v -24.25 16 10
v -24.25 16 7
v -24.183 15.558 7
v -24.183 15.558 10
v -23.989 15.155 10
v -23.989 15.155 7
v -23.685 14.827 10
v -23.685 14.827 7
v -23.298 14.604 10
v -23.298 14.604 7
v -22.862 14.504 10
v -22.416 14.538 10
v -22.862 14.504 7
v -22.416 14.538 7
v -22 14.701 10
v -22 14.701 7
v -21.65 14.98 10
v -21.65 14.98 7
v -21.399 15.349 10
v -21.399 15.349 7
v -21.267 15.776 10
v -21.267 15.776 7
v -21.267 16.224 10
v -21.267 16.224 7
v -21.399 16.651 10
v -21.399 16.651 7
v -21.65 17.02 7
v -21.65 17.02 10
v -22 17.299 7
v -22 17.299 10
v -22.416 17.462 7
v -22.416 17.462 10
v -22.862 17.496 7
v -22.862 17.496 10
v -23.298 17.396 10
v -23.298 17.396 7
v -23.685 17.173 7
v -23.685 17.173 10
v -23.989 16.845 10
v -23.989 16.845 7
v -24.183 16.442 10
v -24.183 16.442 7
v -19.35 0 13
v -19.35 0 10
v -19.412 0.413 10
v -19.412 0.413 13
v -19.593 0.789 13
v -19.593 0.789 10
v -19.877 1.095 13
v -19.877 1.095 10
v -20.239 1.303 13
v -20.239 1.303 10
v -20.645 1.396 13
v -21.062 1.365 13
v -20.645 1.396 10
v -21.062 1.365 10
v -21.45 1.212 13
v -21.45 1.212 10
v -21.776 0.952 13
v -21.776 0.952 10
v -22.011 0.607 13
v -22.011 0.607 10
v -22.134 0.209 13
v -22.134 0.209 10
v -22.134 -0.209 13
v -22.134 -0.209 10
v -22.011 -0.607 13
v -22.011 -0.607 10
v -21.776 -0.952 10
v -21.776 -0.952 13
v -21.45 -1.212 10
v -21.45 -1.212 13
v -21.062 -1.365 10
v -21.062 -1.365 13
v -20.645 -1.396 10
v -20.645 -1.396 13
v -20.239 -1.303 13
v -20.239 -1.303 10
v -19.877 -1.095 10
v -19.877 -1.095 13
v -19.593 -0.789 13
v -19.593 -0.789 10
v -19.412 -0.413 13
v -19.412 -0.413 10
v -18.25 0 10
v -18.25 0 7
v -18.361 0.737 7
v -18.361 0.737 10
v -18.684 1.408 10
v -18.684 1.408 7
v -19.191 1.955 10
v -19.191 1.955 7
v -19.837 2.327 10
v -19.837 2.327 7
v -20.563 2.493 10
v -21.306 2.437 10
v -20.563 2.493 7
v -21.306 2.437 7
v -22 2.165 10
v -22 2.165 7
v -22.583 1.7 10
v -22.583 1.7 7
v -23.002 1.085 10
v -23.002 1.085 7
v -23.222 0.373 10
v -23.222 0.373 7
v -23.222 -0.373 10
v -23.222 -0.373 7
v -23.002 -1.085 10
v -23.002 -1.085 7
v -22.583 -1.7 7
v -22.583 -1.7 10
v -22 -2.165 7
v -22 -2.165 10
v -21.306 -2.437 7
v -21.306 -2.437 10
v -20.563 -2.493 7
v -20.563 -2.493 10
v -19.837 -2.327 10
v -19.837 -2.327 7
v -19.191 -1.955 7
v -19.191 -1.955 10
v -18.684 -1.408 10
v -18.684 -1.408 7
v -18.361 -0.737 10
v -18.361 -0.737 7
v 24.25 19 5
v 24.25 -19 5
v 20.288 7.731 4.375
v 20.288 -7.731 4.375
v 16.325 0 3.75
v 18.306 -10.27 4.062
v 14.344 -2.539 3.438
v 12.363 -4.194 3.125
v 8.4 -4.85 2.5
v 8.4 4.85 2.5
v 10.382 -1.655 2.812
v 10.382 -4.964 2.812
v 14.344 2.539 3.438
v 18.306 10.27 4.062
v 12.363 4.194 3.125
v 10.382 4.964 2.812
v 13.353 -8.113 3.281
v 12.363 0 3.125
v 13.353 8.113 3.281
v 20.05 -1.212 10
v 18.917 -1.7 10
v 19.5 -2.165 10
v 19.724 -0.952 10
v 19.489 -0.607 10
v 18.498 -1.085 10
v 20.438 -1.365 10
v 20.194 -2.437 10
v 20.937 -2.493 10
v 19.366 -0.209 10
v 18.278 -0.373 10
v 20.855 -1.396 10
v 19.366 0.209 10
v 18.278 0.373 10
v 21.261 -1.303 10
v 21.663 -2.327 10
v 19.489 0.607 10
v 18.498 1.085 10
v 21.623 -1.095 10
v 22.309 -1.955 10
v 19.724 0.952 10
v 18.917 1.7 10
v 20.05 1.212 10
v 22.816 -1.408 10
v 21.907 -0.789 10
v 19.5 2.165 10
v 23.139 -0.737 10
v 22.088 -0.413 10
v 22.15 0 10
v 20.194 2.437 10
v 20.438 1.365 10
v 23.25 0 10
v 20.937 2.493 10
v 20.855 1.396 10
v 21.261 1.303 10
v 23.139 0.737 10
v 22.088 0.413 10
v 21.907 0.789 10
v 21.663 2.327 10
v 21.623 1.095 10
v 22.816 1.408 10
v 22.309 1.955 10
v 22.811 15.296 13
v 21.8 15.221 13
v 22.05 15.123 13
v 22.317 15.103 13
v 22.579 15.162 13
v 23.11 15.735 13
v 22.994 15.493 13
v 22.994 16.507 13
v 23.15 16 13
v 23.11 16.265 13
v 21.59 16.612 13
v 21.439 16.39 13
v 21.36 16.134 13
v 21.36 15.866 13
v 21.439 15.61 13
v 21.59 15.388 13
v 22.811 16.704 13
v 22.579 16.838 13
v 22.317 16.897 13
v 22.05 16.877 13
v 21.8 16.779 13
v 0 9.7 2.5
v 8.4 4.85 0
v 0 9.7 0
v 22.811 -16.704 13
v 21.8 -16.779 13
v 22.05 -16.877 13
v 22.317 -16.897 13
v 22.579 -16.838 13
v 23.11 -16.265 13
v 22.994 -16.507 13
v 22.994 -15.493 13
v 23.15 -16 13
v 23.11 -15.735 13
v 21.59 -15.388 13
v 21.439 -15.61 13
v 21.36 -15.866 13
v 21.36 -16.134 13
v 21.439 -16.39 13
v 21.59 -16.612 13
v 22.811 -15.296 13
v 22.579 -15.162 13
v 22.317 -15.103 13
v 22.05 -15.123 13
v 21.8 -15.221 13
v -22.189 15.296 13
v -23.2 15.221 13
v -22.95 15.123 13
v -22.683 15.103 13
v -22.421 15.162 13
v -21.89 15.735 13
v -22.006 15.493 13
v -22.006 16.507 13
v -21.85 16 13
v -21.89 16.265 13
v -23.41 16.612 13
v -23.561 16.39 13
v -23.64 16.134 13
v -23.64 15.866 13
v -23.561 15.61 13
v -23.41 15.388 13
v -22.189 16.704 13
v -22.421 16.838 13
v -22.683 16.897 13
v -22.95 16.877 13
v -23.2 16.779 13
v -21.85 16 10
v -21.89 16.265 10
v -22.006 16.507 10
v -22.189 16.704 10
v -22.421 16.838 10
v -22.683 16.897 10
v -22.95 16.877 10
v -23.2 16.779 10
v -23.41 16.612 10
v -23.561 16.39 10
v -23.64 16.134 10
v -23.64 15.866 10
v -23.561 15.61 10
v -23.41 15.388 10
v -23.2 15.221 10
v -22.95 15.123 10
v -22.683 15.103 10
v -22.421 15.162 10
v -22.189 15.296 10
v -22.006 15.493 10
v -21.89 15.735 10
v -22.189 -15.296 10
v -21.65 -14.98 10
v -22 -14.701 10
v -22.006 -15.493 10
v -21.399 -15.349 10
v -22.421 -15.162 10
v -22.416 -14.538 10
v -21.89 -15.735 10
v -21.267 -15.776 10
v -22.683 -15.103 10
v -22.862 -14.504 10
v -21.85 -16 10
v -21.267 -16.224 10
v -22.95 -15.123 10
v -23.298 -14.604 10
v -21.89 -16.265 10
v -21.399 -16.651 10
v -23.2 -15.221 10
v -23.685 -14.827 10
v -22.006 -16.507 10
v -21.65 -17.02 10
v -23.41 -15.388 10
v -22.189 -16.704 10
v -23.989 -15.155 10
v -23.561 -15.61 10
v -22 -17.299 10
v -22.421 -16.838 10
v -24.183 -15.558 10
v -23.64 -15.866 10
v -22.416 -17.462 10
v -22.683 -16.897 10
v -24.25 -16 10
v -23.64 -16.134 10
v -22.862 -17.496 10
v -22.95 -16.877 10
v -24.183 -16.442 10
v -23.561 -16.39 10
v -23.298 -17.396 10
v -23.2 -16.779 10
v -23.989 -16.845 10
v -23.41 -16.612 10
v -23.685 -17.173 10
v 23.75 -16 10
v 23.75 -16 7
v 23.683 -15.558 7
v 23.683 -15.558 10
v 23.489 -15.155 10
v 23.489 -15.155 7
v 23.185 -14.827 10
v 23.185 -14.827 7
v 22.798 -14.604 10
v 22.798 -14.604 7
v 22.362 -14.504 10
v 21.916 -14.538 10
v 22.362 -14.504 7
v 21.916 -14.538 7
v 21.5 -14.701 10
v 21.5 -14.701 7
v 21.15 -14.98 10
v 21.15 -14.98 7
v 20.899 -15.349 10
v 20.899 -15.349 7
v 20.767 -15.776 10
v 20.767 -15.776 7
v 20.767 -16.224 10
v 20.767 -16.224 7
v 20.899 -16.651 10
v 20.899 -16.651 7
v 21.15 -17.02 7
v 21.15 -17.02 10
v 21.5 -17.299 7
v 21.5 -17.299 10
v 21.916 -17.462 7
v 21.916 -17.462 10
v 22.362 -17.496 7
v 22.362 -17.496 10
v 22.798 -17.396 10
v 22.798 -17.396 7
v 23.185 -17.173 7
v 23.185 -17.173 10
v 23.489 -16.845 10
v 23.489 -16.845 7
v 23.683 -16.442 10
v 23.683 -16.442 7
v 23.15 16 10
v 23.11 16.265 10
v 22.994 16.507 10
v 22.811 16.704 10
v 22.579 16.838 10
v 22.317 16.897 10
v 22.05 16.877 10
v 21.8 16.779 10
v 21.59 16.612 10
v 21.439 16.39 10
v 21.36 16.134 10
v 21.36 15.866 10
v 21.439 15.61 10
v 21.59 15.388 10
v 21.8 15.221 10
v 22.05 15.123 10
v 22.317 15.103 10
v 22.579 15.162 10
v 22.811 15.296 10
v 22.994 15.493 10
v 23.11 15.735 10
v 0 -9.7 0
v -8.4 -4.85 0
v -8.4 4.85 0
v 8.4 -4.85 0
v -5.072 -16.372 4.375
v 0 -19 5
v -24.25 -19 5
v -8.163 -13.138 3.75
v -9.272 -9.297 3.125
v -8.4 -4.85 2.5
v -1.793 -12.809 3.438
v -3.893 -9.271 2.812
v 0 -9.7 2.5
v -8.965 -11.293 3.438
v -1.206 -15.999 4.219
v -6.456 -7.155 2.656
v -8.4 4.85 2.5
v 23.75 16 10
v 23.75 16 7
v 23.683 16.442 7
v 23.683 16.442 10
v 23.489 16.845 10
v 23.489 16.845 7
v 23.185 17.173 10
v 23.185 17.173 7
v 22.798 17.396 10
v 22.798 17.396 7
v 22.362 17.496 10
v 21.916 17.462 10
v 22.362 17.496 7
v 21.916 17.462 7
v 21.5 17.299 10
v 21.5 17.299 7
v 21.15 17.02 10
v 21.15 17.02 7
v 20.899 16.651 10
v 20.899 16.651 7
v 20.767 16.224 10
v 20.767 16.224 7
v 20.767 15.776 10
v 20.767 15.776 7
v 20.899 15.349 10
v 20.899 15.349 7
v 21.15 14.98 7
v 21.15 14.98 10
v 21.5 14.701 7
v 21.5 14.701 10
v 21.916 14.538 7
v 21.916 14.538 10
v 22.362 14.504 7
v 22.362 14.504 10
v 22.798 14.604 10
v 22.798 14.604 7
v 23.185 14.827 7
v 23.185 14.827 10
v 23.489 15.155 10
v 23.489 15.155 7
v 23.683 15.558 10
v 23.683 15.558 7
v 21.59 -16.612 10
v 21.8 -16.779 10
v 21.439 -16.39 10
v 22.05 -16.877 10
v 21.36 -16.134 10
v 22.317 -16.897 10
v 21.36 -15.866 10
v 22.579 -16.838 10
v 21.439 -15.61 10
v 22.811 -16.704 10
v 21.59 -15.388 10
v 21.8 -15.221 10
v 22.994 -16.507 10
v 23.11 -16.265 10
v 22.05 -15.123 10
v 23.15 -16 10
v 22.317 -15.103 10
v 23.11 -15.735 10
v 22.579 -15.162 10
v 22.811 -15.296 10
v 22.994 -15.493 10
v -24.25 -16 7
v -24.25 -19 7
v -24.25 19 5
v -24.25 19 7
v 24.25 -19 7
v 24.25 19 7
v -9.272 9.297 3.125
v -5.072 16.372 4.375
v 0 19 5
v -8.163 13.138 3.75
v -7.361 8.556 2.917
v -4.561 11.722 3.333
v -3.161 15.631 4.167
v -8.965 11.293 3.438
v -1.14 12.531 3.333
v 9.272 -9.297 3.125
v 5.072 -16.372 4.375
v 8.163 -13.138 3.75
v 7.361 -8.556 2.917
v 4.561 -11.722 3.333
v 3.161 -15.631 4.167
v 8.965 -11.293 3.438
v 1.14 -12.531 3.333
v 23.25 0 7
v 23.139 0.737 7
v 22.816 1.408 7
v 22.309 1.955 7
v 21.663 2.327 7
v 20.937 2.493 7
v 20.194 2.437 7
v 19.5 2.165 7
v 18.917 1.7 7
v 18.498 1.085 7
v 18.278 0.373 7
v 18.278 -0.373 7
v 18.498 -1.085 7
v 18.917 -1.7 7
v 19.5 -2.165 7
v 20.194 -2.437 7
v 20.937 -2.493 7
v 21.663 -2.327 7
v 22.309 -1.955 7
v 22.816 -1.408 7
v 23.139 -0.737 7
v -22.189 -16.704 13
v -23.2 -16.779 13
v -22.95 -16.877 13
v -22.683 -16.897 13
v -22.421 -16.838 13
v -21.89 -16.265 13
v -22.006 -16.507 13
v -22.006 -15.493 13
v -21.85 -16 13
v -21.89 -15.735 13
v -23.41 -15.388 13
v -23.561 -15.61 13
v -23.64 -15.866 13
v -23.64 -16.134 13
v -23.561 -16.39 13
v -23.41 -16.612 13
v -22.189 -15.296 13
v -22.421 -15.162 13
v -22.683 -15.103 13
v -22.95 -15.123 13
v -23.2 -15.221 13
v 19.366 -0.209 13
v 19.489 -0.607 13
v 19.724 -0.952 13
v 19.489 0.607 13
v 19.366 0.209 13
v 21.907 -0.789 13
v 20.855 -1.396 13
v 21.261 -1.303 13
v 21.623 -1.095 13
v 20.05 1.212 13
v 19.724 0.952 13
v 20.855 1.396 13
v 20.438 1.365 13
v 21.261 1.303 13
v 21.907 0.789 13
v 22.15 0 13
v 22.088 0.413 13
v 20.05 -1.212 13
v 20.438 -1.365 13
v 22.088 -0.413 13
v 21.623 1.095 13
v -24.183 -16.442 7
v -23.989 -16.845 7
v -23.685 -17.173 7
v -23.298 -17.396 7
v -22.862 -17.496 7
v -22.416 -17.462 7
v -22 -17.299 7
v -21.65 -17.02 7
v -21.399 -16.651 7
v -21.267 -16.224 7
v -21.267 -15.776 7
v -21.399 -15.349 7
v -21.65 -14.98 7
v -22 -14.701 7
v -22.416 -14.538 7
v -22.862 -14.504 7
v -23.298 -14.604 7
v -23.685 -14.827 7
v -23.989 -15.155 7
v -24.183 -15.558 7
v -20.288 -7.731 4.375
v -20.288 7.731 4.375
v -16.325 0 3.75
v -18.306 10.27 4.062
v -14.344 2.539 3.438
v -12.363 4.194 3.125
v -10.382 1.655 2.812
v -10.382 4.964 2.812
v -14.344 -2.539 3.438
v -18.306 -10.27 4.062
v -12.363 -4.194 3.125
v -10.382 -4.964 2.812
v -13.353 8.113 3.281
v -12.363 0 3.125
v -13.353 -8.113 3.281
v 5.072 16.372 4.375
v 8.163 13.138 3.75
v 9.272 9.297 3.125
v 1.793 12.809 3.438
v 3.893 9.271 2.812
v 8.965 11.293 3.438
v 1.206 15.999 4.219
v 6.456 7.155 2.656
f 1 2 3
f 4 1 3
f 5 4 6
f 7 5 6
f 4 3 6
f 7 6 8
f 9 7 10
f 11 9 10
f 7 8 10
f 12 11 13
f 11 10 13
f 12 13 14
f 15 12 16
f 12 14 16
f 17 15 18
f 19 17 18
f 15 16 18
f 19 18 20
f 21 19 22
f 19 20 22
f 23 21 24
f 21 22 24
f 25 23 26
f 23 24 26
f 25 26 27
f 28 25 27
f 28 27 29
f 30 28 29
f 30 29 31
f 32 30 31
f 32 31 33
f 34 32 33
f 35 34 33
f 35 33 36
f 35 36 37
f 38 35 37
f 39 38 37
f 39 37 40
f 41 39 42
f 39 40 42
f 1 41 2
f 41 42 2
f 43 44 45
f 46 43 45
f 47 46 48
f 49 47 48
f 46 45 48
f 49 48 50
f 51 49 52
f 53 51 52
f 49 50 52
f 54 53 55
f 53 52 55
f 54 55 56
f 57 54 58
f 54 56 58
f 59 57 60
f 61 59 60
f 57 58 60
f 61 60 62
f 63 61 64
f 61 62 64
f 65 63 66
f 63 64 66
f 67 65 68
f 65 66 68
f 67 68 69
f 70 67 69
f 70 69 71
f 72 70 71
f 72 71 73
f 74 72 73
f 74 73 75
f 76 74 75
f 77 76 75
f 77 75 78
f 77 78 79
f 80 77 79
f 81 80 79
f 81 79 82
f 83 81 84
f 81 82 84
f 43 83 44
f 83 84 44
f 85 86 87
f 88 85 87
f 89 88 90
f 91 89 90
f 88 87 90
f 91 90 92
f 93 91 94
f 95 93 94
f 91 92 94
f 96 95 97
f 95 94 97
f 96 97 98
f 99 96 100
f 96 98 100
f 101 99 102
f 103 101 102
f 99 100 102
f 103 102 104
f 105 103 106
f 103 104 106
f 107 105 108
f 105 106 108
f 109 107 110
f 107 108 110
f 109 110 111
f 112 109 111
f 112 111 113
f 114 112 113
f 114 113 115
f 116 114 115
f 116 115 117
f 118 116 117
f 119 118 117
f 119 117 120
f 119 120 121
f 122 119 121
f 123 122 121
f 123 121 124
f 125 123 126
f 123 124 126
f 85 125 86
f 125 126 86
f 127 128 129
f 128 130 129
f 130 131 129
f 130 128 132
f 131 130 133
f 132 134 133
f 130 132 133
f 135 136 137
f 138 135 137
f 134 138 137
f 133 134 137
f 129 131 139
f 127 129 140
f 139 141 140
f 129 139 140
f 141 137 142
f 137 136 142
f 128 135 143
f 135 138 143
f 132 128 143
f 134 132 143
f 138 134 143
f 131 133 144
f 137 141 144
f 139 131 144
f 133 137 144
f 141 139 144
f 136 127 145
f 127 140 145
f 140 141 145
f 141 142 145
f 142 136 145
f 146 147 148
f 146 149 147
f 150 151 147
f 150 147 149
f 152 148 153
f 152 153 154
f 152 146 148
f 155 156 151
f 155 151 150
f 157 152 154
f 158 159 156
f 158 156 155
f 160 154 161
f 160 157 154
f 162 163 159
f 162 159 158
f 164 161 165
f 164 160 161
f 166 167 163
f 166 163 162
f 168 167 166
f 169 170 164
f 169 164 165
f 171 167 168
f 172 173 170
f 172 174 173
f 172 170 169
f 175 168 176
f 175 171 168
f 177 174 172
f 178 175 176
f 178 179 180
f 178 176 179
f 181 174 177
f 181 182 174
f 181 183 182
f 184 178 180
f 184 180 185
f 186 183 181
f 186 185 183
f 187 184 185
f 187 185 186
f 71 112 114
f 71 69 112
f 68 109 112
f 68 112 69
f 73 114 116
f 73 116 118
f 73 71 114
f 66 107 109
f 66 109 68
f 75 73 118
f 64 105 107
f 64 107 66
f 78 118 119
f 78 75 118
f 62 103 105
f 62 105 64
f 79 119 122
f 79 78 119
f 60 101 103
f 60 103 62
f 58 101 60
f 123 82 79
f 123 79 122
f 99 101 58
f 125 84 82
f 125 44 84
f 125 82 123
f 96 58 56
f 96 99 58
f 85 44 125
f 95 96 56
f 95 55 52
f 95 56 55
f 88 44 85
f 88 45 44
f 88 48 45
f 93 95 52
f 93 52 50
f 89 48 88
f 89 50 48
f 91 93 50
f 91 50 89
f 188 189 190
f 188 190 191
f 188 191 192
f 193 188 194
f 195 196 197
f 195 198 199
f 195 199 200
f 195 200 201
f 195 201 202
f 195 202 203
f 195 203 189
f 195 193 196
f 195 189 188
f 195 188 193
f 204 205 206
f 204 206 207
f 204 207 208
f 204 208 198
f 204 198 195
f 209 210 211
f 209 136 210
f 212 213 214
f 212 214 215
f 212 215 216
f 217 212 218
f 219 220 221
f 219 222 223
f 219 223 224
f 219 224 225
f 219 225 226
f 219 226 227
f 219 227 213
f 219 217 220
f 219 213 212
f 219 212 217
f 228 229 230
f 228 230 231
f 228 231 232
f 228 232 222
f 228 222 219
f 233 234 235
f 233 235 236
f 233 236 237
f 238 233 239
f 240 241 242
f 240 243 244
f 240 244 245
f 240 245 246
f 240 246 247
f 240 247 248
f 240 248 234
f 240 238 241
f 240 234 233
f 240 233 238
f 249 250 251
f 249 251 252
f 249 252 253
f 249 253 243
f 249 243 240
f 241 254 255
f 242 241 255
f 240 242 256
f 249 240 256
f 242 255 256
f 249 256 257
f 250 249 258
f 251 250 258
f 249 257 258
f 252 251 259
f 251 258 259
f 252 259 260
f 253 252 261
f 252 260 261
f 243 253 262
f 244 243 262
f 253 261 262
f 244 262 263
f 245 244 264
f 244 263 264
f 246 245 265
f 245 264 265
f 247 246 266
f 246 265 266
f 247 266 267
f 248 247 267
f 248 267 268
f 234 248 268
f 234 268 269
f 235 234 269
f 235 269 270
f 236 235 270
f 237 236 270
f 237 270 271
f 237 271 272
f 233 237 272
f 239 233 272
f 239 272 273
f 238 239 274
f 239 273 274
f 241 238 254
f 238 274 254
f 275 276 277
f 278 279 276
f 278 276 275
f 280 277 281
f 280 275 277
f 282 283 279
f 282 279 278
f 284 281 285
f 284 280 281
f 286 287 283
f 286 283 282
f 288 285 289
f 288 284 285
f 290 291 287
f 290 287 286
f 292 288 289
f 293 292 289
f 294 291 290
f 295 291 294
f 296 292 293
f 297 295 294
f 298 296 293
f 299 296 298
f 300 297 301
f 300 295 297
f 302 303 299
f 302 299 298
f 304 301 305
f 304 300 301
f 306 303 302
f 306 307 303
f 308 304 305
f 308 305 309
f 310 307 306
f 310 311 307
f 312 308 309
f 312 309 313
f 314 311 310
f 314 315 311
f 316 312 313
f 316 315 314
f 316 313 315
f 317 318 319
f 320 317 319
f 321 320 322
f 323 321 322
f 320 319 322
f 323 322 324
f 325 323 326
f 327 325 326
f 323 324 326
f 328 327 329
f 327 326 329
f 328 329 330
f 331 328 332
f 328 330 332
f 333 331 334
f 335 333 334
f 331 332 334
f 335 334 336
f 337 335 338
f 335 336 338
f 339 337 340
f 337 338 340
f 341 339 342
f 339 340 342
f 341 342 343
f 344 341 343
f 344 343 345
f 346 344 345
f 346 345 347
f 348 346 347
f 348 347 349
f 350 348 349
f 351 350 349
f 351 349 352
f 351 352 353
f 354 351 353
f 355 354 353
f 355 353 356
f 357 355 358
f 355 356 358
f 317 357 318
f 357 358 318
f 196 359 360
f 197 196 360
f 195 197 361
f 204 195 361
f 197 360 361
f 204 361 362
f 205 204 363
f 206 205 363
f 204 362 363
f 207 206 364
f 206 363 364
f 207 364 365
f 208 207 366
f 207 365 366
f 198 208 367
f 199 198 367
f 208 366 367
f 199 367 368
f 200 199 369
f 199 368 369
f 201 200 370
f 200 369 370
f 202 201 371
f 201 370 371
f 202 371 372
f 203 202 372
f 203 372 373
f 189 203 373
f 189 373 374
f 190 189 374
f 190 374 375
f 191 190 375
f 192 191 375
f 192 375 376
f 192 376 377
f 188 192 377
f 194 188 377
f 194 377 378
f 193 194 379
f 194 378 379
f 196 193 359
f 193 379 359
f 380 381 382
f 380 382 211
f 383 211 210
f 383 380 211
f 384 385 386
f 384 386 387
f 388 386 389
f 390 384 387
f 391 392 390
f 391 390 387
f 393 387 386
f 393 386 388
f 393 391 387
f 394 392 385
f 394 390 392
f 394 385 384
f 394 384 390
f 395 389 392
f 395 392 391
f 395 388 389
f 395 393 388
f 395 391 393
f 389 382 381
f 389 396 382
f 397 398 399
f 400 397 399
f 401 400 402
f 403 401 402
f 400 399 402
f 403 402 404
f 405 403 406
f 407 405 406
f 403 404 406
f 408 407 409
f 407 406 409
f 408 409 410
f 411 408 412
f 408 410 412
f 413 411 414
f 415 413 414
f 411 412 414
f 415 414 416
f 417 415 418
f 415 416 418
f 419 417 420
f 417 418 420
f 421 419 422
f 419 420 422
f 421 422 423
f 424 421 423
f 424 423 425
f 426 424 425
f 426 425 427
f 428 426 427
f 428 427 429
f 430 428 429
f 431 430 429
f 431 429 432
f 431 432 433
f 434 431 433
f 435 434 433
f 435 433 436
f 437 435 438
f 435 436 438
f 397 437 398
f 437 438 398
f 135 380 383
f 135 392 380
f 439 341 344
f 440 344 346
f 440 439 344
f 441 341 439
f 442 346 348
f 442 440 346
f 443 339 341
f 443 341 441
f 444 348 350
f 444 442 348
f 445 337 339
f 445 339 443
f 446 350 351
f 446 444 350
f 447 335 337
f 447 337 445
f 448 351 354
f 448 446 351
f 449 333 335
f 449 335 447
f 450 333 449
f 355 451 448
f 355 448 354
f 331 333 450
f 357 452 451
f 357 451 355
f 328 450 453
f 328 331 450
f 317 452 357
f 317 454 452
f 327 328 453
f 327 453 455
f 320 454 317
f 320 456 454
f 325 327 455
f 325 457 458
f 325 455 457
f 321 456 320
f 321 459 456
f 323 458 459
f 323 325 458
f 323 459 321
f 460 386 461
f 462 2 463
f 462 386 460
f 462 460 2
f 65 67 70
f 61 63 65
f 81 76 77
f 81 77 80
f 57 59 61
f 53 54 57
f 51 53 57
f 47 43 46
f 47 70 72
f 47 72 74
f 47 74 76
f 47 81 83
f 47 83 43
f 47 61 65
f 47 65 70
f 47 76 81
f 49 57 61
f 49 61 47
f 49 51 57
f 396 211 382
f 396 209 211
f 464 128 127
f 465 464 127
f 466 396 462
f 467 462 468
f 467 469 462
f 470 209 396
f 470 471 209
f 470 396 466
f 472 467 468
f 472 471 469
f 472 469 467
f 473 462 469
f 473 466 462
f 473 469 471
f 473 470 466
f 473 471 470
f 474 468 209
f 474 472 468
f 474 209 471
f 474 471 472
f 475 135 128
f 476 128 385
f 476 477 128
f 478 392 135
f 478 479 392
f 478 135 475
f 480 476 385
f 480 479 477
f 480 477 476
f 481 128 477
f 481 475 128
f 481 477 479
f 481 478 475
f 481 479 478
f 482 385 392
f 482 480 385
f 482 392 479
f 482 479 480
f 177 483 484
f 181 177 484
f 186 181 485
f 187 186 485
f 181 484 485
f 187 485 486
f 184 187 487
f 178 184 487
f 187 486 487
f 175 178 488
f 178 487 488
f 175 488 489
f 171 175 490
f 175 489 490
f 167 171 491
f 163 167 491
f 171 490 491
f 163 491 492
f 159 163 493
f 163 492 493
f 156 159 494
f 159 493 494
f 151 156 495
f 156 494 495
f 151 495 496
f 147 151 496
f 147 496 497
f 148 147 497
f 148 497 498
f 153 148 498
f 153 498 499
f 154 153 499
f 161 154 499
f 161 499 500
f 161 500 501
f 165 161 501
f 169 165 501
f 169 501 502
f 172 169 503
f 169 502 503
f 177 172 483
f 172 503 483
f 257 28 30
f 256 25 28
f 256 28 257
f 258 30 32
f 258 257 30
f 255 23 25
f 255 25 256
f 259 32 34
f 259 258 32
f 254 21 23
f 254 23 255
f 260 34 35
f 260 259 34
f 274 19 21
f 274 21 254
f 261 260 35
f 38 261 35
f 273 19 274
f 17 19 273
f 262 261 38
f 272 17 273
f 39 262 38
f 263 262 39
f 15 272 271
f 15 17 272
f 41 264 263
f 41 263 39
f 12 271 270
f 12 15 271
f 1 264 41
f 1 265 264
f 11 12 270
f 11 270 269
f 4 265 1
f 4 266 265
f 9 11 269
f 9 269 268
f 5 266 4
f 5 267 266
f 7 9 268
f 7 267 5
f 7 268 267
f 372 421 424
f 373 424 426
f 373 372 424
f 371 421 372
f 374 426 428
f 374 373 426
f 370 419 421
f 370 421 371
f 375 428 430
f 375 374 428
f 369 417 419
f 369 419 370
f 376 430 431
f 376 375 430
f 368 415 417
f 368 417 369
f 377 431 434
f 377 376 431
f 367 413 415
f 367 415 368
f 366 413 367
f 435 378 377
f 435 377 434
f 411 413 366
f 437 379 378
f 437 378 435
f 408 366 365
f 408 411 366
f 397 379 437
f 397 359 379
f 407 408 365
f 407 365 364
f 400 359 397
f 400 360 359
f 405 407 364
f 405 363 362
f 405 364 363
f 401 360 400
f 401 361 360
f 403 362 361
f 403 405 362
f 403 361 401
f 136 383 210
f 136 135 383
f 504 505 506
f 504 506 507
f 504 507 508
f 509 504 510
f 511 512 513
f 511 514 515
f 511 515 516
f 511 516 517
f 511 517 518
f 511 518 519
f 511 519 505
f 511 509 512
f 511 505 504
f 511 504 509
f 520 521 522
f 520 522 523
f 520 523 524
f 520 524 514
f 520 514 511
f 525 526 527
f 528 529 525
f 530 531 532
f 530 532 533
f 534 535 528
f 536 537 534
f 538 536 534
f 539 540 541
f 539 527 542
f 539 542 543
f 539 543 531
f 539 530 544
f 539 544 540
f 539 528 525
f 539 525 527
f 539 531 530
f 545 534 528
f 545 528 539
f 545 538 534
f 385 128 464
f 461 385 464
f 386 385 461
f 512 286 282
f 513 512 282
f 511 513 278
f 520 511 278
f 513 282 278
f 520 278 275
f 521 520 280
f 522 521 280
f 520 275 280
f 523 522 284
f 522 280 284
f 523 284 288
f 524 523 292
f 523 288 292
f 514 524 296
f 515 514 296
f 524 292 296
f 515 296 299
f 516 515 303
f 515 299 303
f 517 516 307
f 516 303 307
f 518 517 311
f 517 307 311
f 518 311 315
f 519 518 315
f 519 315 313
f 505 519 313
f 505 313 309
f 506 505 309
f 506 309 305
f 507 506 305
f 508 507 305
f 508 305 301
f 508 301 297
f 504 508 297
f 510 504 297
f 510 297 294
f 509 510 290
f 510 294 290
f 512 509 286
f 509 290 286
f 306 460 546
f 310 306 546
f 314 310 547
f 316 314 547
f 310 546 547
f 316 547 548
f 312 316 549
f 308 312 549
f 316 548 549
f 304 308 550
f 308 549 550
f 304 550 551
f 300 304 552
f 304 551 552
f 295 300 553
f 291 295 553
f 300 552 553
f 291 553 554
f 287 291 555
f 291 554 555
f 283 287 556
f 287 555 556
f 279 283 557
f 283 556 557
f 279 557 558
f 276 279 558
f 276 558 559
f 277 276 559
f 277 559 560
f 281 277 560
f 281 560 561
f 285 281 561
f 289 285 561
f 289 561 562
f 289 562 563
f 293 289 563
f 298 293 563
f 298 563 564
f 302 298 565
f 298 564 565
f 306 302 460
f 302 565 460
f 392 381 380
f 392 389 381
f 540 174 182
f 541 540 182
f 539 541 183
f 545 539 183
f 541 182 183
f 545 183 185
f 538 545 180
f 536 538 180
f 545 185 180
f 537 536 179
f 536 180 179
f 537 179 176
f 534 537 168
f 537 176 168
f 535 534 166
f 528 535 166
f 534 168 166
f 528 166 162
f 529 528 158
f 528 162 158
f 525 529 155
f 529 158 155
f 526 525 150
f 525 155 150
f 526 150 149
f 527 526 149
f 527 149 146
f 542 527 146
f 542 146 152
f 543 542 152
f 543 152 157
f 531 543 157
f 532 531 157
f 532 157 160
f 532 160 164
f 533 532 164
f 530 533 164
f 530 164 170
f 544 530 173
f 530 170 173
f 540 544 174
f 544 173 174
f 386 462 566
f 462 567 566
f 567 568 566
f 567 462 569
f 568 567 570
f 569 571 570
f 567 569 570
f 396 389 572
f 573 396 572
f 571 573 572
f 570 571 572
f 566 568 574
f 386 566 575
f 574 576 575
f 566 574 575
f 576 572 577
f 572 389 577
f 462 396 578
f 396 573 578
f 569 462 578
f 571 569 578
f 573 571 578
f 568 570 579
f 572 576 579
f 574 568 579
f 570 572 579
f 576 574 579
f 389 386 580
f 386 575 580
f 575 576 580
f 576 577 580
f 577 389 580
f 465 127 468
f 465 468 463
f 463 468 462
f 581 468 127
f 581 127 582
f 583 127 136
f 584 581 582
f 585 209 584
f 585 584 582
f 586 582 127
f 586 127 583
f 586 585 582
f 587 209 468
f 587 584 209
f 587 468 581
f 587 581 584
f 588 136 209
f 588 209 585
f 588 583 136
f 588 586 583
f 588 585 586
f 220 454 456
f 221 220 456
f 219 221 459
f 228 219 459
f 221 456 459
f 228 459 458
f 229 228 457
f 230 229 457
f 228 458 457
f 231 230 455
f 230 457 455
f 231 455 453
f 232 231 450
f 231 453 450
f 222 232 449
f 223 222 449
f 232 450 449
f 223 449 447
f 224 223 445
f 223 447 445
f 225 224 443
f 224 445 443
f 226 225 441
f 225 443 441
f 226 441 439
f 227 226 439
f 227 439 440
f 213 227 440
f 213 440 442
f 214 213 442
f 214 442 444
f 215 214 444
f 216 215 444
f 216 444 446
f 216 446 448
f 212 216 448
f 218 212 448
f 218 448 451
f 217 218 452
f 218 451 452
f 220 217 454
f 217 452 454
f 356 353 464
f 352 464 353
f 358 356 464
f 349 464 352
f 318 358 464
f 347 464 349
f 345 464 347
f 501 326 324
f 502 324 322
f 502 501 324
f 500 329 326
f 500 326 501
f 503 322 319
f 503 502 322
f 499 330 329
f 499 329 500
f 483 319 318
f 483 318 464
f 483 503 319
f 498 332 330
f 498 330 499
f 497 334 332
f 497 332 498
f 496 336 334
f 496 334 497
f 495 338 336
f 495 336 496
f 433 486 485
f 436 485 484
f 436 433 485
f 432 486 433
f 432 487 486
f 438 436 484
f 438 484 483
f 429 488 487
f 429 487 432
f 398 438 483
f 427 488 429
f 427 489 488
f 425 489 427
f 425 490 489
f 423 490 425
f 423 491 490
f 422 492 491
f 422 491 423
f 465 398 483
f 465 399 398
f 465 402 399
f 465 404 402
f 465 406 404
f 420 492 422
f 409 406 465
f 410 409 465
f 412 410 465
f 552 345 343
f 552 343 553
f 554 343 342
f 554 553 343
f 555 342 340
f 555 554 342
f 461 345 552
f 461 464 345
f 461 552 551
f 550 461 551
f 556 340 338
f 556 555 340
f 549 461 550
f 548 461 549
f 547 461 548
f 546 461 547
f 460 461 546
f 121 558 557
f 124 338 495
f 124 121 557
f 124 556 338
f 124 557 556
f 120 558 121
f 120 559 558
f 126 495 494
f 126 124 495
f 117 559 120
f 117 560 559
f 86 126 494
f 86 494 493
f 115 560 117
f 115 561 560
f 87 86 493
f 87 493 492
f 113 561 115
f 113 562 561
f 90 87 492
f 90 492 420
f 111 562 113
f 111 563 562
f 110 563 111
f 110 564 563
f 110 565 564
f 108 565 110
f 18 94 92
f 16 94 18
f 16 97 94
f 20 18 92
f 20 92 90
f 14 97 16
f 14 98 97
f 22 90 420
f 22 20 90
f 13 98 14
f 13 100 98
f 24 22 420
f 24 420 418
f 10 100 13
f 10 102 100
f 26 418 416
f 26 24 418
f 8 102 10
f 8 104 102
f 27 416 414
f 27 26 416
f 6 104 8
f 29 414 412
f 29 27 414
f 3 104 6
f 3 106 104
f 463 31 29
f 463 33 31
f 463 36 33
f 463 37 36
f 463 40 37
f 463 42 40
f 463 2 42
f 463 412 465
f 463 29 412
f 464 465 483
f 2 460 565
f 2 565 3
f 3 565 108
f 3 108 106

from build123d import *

# Parameters (mm, degrees)
SKIZZE2_2_W                     = 38
SKIZZE2_2_H                     = 48.5
AUFSATZ_LINEAR_AUSTRAGEN1_DEPTH = 2
SKIZZE4_R                       = 2.5
SKIZZE4_R_2                     = 1.5
AUFSATZ_LINEAR_AUSTRAGEN2_DEPTH = 3
SKIZZE5_R                       = 0.9
SKIZZE5_R_2                     = 1.4
AUFSATZ_LINEAR_AUSTRAGEN3_DEPTH = 3


with BuildPart() as part:
    # Skizze1 → Ausformung3 section 0
    with BuildSketch(Plane(origin=(0, 0, 0), x_dir=(0, 1, 0), z_dir=(0, 0, 1))):
        with BuildLine():
            Line((-4.85, 8.400446417), (-9.7, 0))
            Line((-9.7, 0), (-4.85, -8.400446417))
            Line((-4.85, -8.400446417), (4.85, -8.400446417))
            Line((4.85, -8.400446417), (9.7, 0))
            Line((9.7, 0), (4.85, 8.400446417))
            Line((4.85, 8.400446417), (-4.85, 8.400446417))
        make_face()
    # Skizze3 → Ausformung3 section 1
    with BuildSketch(Plane(origin=(0, 0, 2.5), x_dir=(0, 1, 0), z_dir=(0, 0, 1))):
        with BuildLine():
            Line((4.85, 8.400446417), (-4.85, 8.400446417))
            Line((-4.85, 8.400446417), (-9.7, 0))
            Line((-9.7, 0), (-4.85, -8.400446417))
            Line((-4.85, -8.400446417), (4.85, -8.400446417))
            Line((4.85, -8.400446417), (9.7, 0))
            Line((9.7, 0), (4.85, 8.400446417))
        make_face()
    loft()

    # Ausformung4: read off the stored shape, not the designer's step
    # Ausformung4: loft between two sections, ruled curve by curve
    ausformung4_from = [
        Edge.make_bspline([(24.25, -19, 5), (20.208333333, -19, 5), (16.166666667, -19, 5), (8.083333333, -19, 5), (4.041666667, -19, 5), (0, -19, 5)], [0, 0, 0, 0, 0.5, 0.5, 1, 1, 1, 1], 3),
        Edge.make_bspline([(0, -19, 5), (-4.041666667, -19, 5), (-8.083333333, -19, 5), (-16.166666667, -19, 5), (-20.208333333, -19, 5), (-24.25, -19, 5)], [0, 0, 0, 0, 0.5, 0.5, 1, 1, 1, 1], 3),
        Edge.make_bspline([(-24.25, 19, 5), (-20.208333333, 19, 5), (-16.166666667, 19, 5), (-8.083333333, 19, 5), (-4.041666667, 19, 5), (0, 19, 5)], [0, 0, 0, 0, 0.5, 0.5, 1, 1, 1, 1], 3),
        Edge.make_bspline([(0, 19, 5), (4.041666667, 19, 5), (8.083333333, 19, 5), (16.166666667, 19, 5), (20.208333333, 19, 5), (24.25, 19, 5)], [0, 0, 0, 0, 0.5, 0.5, 1, 1, 1, 1], 3),
        Edge.make_line((24.25, -19, 5), (24.25, 19, 5)),
        Edge.make_line((-24.25, 19, 5), (-24.25, -19, 5)),
    ]
    ausformung4_to = [
        Edge.make_bspline([(8.400446417, -4.85, 2.5), (7.000372014, -5.658333333, 2.5), (5.600297611, -6.466666667, 2.5), (2.800148806, -8.083333333, 2.5), (1.400074403, -8.891666667, 2.5), (0, -9.7, 2.5)], [0, 0, 0, 0, 0.5, 0.5, 1, 1, 1, 1], 3),
        Edge.make_bspline([(0, -9.7, 2.5), (-1.400074403, -8.891666667, 2.5), (-2.800148806, -8.083333333, 2.5), (-5.600297611, -6.466666667, 2.5), (-7.000372014, -5.658333333, 2.5), (-8.400446417, -4.85, 2.5)], [0, 0, 0, 0, 0.5, 0.5, 1, 1, 1, 1], 3),
        Edge.make_bspline([(-8.400446417, 4.85, 2.5), (-7.000372014, 5.658333333, 2.5), (-5.600297611, 6.466666667, 2.5), (-2.800148806, 8.083333333, 2.5), (-1.400074403, 8.891666667, 2.5), (0, 9.7, 2.5)], [0, 0, 0, 0, 0.5, 0.5, 1, 1, 1, 1], 3),
        Edge.make_bspline([(0, 9.7, 2.5), (1.400074403, 8.891666667, 2.5), (2.800148806, 8.083333333, 2.5), (5.600297611, 6.466666667, 2.5), (7.000372014, 5.658333333, 2.5), (8.400446417, 4.85, 2.5)], [0, 0, 0, 0, 0.5, 0.5, 1, 1, 1, 1], 3),
        Edge.make_line((8.400446417, -4.85, 2.5), (8.400446417, 4.85, 2.5)),
        Edge.make_line((-8.400446417, 4.85, 2.5), (-8.400446417, -4.85, 2.5)),
    ]
    ausformung4 = Solid(Shell([*[Face.make_surface_from_curves(ausformung4_from[k], ausformung4_to[k]) for k in range(6)], Face(Wire(ausformung4_from)), Face(Wire(ausformung4_to))]))
    add(ausformung4)

    # Skizze2<2> → Aufsatz-Linear austragen1 (add)
    with BuildSketch(Plane(origin=(0, 0, 5), x_dir=(0, 1, 0), z_dir=(0, 0, 1))):
        Rectangle(SKIZZE2_2_W, SKIZZE2_2_H)
    extrude(amount=AUFSATZ_LINEAR_AUSTRAGEN1_DEPTH)

    # Skizze4 → Aufsatz-Linear austragen2 (add)
    with BuildSketch(Plane.XY.offset(7)):
        with Locations((-20.75, 0)):
            Circle(SKIZZE4_R)
        with Locations((20.75, 0)):
            Circle(SKIZZE4_R)
        with Locations(Location((-22.75, 16, 0), (0, 0, 180))):
            Circle(SKIZZE4_R_2)
        with Locations(Location((-22.75, -16, 0), (0, 0, 180))):
            Circle(SKIZZE4_R_2)
        with Locations((22.25, 16)):
            Circle(SKIZZE4_R_2)
        with Locations((22.25, -16)):
            Circle(SKIZZE4_R_2)
    extrude(amount=AUFSATZ_LINEAR_AUSTRAGEN2_DEPTH)

    # Skizze5 → Aufsatz-Linear austragen3 (add)
    with BuildSketch(Plane.XY.offset(10)):
        with Locations((-22.75, 16)):
            Circle(SKIZZE5_R)
        with Locations((-22.75, -16)):
            Circle(SKIZZE5_R)
        with Locations((-20.75, 0)):
            Circle(SKIZZE5_R_2)
        with Locations((20.75, 0)):
            Circle(SKIZZE5_R_2)
        with Locations((22.25, 16)):
            Circle(SKIZZE5_R)
        with Locations((22.25, -16)):
            Circle(SKIZZE5_R)
    extrude(amount=AUFSATZ_LINEAR_AUSTRAGEN3_DEPTH)


solid = part.part
